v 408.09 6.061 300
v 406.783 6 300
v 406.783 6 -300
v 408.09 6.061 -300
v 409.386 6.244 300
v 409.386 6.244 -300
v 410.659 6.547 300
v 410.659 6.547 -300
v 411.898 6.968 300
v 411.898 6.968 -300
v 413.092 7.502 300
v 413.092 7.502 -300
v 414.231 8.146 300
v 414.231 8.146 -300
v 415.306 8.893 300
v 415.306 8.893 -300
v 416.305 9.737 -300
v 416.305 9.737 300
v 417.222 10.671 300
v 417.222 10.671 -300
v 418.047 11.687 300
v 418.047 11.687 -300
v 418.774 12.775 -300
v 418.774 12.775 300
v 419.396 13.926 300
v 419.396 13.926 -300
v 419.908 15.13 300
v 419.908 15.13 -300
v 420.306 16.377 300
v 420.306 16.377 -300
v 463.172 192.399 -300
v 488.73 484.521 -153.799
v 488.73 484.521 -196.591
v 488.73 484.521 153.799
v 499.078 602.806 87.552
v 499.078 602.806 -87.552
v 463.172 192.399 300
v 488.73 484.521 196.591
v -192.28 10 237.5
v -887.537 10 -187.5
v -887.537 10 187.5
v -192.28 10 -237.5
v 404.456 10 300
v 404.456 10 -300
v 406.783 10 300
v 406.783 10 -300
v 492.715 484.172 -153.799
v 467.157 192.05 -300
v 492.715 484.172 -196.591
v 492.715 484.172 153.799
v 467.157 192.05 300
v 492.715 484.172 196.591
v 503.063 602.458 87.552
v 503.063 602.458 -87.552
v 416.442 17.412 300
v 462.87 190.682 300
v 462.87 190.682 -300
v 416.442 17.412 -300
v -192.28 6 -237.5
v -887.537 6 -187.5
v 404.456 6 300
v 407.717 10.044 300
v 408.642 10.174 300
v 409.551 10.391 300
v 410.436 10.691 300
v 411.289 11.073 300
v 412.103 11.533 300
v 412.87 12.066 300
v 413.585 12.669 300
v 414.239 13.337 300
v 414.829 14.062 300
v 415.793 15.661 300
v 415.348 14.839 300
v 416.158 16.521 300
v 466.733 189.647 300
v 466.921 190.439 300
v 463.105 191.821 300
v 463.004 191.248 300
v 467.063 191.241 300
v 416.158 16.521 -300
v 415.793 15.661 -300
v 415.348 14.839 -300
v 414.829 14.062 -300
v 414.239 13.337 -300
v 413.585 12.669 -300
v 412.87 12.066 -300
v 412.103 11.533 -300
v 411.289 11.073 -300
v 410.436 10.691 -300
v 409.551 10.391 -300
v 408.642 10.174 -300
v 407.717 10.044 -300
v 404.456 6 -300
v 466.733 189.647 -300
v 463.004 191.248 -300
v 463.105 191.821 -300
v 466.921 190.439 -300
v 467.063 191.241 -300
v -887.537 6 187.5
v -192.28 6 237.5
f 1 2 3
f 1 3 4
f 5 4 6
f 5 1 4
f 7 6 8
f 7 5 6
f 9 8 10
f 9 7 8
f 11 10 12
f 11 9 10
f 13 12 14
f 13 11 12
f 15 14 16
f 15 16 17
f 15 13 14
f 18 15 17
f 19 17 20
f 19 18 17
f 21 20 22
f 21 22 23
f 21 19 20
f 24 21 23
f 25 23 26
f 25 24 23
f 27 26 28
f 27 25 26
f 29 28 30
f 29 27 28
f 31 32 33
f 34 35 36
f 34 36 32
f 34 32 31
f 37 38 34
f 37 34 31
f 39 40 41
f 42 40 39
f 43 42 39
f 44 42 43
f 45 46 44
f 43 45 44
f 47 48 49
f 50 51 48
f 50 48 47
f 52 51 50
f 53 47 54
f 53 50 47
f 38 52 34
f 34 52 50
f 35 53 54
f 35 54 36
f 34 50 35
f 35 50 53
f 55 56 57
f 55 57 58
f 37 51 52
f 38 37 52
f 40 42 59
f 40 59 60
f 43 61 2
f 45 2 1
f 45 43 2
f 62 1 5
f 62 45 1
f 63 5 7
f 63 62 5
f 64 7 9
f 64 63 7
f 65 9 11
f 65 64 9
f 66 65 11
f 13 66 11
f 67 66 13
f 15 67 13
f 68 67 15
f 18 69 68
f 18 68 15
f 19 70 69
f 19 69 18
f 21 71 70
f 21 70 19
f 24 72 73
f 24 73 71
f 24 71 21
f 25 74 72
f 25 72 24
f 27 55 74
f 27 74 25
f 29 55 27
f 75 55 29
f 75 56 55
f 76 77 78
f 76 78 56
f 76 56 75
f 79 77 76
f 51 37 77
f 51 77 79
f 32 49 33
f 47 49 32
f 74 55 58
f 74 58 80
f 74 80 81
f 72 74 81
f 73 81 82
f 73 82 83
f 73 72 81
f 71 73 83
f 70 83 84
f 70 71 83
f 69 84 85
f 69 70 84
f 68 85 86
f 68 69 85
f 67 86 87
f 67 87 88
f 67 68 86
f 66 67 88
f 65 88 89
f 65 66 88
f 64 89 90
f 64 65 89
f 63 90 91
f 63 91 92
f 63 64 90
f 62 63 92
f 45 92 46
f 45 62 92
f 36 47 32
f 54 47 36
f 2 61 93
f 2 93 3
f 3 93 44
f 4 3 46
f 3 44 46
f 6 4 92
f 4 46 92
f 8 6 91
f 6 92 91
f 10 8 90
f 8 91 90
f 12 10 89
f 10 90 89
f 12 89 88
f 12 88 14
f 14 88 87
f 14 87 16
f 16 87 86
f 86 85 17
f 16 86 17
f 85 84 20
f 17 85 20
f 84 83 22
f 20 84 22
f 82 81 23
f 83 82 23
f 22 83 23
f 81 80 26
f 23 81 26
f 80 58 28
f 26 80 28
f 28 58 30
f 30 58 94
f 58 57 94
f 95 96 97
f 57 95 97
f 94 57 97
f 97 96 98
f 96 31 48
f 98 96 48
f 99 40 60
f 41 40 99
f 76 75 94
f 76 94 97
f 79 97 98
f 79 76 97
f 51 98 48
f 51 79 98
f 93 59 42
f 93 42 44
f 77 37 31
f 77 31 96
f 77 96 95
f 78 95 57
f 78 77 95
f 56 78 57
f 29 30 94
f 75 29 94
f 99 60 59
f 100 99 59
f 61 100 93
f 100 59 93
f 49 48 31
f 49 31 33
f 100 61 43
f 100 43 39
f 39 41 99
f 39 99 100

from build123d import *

# Parameters (mm, degrees)
BOSS_EXTRUDE1_DEPTH          = 10
CONVERT_SOLID1_DEPTH         = 6
EDGE_FLANGE2_DEPTH           = 600
EDGE_FLANGE4_STRIP_CUT_DEPTH = 600
EDGE_FLANGE4_DEPTH           = 600
CUT_EXTRUDE2_DEPTH           = 952.374861111
CUT_EXTRUDE2_DEPTH_BACK      = 952.374861111
TAB1_DEPTH                   = 4


# Read off the part's stored shape, not the designer's step: Convert-Solid1
# Sheet-metal steps are written as plain solids
with BuildPart() as part:
    # Sketch1 → Boss-Extrude1 (new body)
    with BuildSketch(Plane(origin=(0, 0, 0), x_dir=(1, 0, 0), z_dir=(0, 1, 0))):
        Polygon((-192.279765905, 237.5), (404.456147209, 300), (404.456147209, 0), (404.456147209, -300), (-192.279765905, -237.5), align=None)
    extrude(amount=BOSS_EXTRUDE1_DEPTH)

    # Convert-Solid1 outline → Convert-Solid1 (cut)
    with BuildSketch(Plane(origin=(0, 0, 0), x_dir=(1, 0, 0), z_dir=(0, 1, 0))):
        Polygon((-192.279765905, 237.5), (-192.279765905, -237.5), (404.456147209, -300), (404.456147209, 300), align=None)
    extrude(amount=CONVERT_SOLID1_DEPTH, mode=Mode.SUBTRACT)

    # Edge-Flange2 section (across the edge) → Edge-Flange2 (add)
    with BuildSketch(Plane(origin=(414.456147209, 10, 300), x_dir=(-0.9659258262890673, 0.25881904510252446, 0), z_dir=(0, 0, -1))):
        with BuildLine():
            Line((-4, 7.67326988), (-4, 187.930692048))
            Line((-4, 187.930692048), (0, 187.930692048))
            Line((0, 187.930692048), (0, 7.67326988))
            ThreePointArc((0, 7.67326988), (2.066466597, 1.58565559), (7.411809549, -1.985988383))
            Line((7.411809549, -1.985988383), (9.659258263, -2.588190451))
            Line((9.659258263, -2.588190451), (8.623982082, -6.451893756))
            Line((8.623982082, -6.451893756), (6.376533369, -5.849691688))
            ThreePointArc((6.376533369, -5.849691688), (-1.106946764, -0.849390126), (-4, 7.67326988))
        make_face()
    extrude(amount=EDGE_FLANGE2_DEPTH)

    # Edge-Flange4 strip (across the edge) → Edge-Flange4 strip cut (cut)
    with BuildSketch(Plane(origin=(463.09618947, 191.527109002, 300), x_dir=(-0.9961946980917449, 0.0871557427476667, 0), z_dir=(0, 0, -1))):
        Polygon((-10.038642938, 33.896891256), (-3.787308542, -1.556187852), (0.15192247, -0.861595141), (-6.099411926, 34.591483967), align=None)
    extrude(amount=EDGE_FLANGE4_STRIP_CUT_DEPTH, mode=Mode.SUBTRACT)

    # Edge-Flange4 section (across the edge) → Edge-Flange4 (add)
    with BuildSketch(Plane(origin=(463.09618947, 191.527109002, 300), x_dir=(-0.9961946980917449, 0.0871557427476667, 0), z_dir=(0, 0, -1))):
        with BuildLine():
            Line((-4, 0.874886635), (-4, 412.850045346))
            Line((-4, 412.850045346), (0, 412.850045346))
            Line((0, 412.850045346), (0, 0.874886635))
            ThreePointArc((0, 0.874886635), (0.038053019, 0.003329208), (0.15192247, -0.861595141))
            Line((0.15192247, -0.861595141), (-3.787308542, -1.556187852))
            ThreePointArc((-3.787308542, -1.556187852), (-3.946725773, -0.345293763), (-4, 0.874886635))
        make_face()
    extrude(amount=EDGE_FLANGE4_DEPTH)

    # Sketch22 → Cut-Extrude2 (cut, two sides: drawn at the far end of the back side and taken through both)
    with BuildSketch(Plane(origin=(442.9492869, -38.753041121, 0), x_dir=(0, 0, 1), z_dir=(-0.9961946980917449, 0.08715574274766662, 0)).offset(-CUT_EXTRUDE2_DEPTH_BACK)):
        Polygon((300, 232.03466952), (196.591479546, 525.272945681), (153.798650158, 525.272945681), (87.551647761, 644.009828231), (302.699803465, 645.121208779), (304.833664863, 232.03466952), align=None)
        Polygon((-300, 232.03466952), (-196.591479546, 525.272945681), (-153.798650158, 525.272945681), (-87.551647761, 644.009828231), (-302.699803465, 645.121208779), (-304.833664863, 232.03466952), align=None)
    extrude(amount=CUT_EXTRUDE2_DEPTH + CUT_EXTRUDE2_DEPTH_BACK, mode=Mode.SUBTRACT)

    # Sketch24 → Tab1 (add)
    with BuildSketch(Plane(origin=(0, 10, 0), x_dir=(1, 0, 0), z_dir=(0, 1, 0))):
        Polygon((-192.279765905, 237.5), (-887.537085834, 187.5), (-887.537085834, -187.5), (-192.279765905, -237.5), align=None)
    extrude(amount=-TAB1_DEPTH)


solid = part.part
